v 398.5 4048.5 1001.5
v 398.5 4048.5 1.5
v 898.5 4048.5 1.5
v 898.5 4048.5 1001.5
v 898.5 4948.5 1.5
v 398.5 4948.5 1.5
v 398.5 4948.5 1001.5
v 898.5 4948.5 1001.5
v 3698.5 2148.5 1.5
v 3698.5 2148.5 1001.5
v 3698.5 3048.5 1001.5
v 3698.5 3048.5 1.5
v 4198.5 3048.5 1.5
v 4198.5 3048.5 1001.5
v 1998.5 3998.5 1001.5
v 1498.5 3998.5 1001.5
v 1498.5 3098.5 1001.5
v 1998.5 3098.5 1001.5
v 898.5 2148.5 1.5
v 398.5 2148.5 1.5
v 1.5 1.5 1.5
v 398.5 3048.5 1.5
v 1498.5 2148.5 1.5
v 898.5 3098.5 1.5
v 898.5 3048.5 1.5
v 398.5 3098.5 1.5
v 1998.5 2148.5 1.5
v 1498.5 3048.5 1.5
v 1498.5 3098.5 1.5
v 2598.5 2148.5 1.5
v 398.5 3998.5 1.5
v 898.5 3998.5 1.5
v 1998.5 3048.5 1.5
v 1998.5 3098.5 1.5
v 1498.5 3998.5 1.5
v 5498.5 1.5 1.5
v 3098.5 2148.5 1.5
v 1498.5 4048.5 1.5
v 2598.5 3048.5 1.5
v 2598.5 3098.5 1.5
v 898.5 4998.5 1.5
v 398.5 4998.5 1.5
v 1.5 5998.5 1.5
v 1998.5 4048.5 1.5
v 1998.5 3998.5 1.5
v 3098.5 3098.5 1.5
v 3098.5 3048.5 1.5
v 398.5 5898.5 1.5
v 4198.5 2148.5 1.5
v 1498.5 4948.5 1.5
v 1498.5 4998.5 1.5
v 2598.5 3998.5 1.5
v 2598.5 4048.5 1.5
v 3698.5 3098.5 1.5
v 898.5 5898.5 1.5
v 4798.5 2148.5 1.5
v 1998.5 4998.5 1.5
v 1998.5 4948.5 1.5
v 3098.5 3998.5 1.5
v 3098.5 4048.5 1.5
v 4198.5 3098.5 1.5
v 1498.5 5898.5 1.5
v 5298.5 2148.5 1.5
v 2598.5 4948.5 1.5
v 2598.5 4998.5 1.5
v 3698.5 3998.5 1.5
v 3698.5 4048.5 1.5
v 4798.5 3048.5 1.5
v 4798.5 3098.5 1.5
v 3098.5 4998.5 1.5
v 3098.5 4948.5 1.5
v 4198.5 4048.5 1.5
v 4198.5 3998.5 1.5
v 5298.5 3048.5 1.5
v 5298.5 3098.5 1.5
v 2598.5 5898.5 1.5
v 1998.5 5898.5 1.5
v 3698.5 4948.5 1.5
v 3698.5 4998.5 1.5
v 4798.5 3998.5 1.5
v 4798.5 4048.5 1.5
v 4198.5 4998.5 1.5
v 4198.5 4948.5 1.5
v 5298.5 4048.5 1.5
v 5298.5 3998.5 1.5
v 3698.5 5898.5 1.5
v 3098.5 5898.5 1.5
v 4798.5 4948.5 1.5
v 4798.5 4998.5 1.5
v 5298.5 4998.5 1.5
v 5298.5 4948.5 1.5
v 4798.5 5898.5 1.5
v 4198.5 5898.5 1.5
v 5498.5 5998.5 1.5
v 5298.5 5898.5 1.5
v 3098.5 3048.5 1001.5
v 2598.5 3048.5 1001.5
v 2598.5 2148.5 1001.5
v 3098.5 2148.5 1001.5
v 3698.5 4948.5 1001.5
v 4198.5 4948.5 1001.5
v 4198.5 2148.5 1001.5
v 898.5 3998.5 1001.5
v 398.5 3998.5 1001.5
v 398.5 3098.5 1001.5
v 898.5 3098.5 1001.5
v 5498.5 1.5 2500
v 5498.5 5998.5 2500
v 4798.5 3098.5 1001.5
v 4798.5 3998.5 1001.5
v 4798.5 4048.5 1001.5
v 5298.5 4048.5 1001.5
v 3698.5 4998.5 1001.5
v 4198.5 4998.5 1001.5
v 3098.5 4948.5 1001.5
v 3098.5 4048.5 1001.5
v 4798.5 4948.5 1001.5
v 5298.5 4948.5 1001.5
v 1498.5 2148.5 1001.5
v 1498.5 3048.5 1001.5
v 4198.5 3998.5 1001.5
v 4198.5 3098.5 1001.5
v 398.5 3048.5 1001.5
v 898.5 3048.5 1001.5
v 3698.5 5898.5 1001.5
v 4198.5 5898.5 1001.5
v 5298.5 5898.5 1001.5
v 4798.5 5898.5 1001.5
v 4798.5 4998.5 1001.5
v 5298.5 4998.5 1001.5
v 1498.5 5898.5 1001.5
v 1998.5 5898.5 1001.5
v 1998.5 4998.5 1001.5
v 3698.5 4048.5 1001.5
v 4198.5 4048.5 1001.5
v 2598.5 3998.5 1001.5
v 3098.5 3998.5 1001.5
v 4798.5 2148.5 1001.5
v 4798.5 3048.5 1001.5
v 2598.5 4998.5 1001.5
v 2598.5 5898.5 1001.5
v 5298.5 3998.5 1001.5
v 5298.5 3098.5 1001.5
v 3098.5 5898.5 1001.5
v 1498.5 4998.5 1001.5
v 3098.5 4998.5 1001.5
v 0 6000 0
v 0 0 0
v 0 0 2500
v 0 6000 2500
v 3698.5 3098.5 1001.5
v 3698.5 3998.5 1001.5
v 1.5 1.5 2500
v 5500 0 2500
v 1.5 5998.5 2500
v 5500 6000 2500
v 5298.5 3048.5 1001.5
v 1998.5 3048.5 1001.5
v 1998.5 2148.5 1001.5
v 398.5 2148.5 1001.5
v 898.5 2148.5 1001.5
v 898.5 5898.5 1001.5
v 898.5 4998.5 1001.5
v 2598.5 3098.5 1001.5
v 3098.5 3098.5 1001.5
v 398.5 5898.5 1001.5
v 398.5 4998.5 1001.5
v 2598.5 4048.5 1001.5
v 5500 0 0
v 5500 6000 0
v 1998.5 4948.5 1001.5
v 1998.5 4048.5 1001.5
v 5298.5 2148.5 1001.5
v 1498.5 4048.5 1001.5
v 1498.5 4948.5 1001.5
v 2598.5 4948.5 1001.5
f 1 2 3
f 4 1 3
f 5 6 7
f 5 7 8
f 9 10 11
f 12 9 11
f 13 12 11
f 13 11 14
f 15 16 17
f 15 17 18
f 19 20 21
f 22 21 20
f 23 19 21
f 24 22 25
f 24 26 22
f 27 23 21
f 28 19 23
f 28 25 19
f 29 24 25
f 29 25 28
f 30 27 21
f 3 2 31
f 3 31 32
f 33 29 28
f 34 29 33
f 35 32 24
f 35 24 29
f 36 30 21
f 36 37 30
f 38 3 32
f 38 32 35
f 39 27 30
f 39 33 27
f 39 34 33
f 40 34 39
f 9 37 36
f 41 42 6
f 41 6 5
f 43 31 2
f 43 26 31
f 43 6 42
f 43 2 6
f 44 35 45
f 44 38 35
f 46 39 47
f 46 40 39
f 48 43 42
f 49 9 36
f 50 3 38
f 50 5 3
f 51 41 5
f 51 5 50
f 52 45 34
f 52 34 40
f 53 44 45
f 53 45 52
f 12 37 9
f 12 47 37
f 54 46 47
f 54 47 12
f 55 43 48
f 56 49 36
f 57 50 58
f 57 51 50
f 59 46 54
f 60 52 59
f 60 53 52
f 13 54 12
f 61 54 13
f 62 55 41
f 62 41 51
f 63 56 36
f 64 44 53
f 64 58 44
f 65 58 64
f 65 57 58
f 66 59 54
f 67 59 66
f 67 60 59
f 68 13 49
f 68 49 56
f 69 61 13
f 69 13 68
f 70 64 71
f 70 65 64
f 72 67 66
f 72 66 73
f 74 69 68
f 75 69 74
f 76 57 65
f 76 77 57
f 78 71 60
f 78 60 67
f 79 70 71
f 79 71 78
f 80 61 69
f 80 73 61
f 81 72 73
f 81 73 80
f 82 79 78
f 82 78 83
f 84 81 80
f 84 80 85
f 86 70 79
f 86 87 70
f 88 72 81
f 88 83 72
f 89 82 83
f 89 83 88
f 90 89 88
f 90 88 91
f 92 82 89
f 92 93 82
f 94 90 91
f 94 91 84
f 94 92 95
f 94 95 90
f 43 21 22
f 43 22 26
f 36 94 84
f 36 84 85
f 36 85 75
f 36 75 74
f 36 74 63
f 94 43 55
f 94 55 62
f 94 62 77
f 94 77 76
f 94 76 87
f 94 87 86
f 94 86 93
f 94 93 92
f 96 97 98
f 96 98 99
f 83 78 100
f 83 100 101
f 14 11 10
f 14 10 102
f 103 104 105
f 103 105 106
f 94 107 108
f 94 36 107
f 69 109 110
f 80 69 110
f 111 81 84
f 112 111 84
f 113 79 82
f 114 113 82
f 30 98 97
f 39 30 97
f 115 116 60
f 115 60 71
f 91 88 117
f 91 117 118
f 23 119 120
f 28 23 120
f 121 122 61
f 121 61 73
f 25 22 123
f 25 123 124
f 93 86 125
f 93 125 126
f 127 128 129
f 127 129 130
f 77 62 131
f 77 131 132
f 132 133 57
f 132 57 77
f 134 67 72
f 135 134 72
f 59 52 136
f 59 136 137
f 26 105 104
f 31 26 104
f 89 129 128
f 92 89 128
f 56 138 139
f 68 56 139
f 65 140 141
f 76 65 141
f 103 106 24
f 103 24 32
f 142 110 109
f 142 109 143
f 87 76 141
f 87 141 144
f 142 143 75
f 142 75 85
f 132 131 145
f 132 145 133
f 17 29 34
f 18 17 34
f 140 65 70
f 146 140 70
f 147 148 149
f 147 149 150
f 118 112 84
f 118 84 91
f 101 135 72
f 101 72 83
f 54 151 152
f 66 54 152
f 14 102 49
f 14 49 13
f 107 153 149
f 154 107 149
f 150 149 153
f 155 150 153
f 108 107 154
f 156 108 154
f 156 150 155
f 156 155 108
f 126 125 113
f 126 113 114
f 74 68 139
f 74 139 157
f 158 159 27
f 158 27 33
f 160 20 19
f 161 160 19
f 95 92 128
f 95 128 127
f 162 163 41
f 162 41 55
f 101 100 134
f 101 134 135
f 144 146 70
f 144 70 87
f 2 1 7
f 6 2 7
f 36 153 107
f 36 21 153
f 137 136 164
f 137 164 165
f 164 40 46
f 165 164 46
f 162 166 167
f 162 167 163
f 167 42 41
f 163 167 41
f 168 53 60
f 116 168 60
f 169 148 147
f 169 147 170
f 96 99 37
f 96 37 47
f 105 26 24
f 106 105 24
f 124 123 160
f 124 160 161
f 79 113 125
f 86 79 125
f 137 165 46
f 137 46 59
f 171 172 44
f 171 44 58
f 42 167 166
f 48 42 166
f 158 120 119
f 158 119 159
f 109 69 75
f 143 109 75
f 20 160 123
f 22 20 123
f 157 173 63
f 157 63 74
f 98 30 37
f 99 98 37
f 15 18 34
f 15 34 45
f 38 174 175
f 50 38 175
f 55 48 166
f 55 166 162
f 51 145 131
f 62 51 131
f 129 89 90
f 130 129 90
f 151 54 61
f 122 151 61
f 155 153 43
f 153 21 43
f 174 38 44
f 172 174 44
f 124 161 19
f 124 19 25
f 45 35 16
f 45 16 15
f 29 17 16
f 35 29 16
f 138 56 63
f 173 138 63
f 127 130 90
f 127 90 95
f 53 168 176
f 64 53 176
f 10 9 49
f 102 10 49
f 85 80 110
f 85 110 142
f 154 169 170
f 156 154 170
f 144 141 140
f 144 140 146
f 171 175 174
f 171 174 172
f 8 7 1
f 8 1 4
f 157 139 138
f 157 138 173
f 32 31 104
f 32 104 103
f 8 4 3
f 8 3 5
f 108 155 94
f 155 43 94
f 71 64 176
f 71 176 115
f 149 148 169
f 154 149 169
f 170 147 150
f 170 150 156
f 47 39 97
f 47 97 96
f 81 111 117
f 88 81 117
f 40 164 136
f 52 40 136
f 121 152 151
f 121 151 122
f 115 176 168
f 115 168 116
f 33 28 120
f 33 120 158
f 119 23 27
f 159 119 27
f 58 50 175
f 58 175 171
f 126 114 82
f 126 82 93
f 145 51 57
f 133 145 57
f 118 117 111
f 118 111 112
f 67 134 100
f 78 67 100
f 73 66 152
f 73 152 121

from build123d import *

# Parameters (mm, degrees)
F0_W     = 5500
F0_H     = 6000
F1_DEPTH = 2500
F2_T     = -1.5
F3_W     = 500
F3_H     = 900
F4_DEPTH = 1000


with BuildPart() as f1:
    # F0 (on Top) → F1 (new body)
    with BuildSketch(Plane.XY):
        with Locations((2750, 3000)):
            Rectangle(F0_W, F0_H)
    extrude(amount=F1_DEPTH)

    # F2
    f2_openings = [f1.faces().sort_by_distance(p)[0] for p in [
        (2750, 3000, 2500),
    ]]
    offset(amount=F2_T, openings=f2_openings)

    # F3 (on face) → F4 (join)
    with BuildSketch(Plane.XY.offset(1.5)):
        with Locations((5048.5, 5448.5)):
            Rectangle(F3_W, F3_H)
        with Locations((5048.5, 4498.5)):
            Rectangle(F3_W, F3_H)
        with Locations((5048.5, 3548.5)):
            Rectangle(F3_W, F3_H)
        with Locations((5048.5, 2598.5)):
            Rectangle(F3_W, F3_H)
        with Locations((3948.5, 5448.5)):
            Rectangle(F3_W, F3_H)
        with Locations((3948.5, 4498.5)):
            Rectangle(F3_W, F3_H)
        with Locations((3948.5, 3548.5)):
            Rectangle(F3_W, F3_H)
        with Locations((3948.5, 2598.5)):
            Rectangle(F3_W, F3_H)
        with Locations((2848.5, 5448.5)):
            Rectangle(F3_W, F3_H)
        with Locations((2848.5, 4498.5)):
            Rectangle(F3_W, F3_H)
        with Locations((2848.5, 3548.5)):
            Rectangle(F3_W, F3_H)
        with Locations((2848.5, 2598.5)):
            Rectangle(F3_W, F3_H)
        with Locations((1748.5, 5448.5)):
            Rectangle(F3_W, F3_H)
        with Locations((1748.5, 4498.5)):
            Rectangle(F3_W, F3_H)
        with Locations((1748.5, 3548.5)):
            Rectangle(F3_W, F3_H)
        with Locations((1748.5, 2598.5)):
            Rectangle(F3_W, F3_H)
        with Locations((648.5, 5448.5)):
            Rectangle(F3_W, F3_H)
        with Locations((648.5, 4498.5)):
            Rectangle(F3_W, F3_H)
        with Locations((648.5, 3548.5)):
            Rectangle(F3_W, F3_H)
        with Locations((648.5, 2598.5)):
            Rectangle(F3_W, F3_H)
    extrude(amount=F4_DEPTH)


solid = f1.part
